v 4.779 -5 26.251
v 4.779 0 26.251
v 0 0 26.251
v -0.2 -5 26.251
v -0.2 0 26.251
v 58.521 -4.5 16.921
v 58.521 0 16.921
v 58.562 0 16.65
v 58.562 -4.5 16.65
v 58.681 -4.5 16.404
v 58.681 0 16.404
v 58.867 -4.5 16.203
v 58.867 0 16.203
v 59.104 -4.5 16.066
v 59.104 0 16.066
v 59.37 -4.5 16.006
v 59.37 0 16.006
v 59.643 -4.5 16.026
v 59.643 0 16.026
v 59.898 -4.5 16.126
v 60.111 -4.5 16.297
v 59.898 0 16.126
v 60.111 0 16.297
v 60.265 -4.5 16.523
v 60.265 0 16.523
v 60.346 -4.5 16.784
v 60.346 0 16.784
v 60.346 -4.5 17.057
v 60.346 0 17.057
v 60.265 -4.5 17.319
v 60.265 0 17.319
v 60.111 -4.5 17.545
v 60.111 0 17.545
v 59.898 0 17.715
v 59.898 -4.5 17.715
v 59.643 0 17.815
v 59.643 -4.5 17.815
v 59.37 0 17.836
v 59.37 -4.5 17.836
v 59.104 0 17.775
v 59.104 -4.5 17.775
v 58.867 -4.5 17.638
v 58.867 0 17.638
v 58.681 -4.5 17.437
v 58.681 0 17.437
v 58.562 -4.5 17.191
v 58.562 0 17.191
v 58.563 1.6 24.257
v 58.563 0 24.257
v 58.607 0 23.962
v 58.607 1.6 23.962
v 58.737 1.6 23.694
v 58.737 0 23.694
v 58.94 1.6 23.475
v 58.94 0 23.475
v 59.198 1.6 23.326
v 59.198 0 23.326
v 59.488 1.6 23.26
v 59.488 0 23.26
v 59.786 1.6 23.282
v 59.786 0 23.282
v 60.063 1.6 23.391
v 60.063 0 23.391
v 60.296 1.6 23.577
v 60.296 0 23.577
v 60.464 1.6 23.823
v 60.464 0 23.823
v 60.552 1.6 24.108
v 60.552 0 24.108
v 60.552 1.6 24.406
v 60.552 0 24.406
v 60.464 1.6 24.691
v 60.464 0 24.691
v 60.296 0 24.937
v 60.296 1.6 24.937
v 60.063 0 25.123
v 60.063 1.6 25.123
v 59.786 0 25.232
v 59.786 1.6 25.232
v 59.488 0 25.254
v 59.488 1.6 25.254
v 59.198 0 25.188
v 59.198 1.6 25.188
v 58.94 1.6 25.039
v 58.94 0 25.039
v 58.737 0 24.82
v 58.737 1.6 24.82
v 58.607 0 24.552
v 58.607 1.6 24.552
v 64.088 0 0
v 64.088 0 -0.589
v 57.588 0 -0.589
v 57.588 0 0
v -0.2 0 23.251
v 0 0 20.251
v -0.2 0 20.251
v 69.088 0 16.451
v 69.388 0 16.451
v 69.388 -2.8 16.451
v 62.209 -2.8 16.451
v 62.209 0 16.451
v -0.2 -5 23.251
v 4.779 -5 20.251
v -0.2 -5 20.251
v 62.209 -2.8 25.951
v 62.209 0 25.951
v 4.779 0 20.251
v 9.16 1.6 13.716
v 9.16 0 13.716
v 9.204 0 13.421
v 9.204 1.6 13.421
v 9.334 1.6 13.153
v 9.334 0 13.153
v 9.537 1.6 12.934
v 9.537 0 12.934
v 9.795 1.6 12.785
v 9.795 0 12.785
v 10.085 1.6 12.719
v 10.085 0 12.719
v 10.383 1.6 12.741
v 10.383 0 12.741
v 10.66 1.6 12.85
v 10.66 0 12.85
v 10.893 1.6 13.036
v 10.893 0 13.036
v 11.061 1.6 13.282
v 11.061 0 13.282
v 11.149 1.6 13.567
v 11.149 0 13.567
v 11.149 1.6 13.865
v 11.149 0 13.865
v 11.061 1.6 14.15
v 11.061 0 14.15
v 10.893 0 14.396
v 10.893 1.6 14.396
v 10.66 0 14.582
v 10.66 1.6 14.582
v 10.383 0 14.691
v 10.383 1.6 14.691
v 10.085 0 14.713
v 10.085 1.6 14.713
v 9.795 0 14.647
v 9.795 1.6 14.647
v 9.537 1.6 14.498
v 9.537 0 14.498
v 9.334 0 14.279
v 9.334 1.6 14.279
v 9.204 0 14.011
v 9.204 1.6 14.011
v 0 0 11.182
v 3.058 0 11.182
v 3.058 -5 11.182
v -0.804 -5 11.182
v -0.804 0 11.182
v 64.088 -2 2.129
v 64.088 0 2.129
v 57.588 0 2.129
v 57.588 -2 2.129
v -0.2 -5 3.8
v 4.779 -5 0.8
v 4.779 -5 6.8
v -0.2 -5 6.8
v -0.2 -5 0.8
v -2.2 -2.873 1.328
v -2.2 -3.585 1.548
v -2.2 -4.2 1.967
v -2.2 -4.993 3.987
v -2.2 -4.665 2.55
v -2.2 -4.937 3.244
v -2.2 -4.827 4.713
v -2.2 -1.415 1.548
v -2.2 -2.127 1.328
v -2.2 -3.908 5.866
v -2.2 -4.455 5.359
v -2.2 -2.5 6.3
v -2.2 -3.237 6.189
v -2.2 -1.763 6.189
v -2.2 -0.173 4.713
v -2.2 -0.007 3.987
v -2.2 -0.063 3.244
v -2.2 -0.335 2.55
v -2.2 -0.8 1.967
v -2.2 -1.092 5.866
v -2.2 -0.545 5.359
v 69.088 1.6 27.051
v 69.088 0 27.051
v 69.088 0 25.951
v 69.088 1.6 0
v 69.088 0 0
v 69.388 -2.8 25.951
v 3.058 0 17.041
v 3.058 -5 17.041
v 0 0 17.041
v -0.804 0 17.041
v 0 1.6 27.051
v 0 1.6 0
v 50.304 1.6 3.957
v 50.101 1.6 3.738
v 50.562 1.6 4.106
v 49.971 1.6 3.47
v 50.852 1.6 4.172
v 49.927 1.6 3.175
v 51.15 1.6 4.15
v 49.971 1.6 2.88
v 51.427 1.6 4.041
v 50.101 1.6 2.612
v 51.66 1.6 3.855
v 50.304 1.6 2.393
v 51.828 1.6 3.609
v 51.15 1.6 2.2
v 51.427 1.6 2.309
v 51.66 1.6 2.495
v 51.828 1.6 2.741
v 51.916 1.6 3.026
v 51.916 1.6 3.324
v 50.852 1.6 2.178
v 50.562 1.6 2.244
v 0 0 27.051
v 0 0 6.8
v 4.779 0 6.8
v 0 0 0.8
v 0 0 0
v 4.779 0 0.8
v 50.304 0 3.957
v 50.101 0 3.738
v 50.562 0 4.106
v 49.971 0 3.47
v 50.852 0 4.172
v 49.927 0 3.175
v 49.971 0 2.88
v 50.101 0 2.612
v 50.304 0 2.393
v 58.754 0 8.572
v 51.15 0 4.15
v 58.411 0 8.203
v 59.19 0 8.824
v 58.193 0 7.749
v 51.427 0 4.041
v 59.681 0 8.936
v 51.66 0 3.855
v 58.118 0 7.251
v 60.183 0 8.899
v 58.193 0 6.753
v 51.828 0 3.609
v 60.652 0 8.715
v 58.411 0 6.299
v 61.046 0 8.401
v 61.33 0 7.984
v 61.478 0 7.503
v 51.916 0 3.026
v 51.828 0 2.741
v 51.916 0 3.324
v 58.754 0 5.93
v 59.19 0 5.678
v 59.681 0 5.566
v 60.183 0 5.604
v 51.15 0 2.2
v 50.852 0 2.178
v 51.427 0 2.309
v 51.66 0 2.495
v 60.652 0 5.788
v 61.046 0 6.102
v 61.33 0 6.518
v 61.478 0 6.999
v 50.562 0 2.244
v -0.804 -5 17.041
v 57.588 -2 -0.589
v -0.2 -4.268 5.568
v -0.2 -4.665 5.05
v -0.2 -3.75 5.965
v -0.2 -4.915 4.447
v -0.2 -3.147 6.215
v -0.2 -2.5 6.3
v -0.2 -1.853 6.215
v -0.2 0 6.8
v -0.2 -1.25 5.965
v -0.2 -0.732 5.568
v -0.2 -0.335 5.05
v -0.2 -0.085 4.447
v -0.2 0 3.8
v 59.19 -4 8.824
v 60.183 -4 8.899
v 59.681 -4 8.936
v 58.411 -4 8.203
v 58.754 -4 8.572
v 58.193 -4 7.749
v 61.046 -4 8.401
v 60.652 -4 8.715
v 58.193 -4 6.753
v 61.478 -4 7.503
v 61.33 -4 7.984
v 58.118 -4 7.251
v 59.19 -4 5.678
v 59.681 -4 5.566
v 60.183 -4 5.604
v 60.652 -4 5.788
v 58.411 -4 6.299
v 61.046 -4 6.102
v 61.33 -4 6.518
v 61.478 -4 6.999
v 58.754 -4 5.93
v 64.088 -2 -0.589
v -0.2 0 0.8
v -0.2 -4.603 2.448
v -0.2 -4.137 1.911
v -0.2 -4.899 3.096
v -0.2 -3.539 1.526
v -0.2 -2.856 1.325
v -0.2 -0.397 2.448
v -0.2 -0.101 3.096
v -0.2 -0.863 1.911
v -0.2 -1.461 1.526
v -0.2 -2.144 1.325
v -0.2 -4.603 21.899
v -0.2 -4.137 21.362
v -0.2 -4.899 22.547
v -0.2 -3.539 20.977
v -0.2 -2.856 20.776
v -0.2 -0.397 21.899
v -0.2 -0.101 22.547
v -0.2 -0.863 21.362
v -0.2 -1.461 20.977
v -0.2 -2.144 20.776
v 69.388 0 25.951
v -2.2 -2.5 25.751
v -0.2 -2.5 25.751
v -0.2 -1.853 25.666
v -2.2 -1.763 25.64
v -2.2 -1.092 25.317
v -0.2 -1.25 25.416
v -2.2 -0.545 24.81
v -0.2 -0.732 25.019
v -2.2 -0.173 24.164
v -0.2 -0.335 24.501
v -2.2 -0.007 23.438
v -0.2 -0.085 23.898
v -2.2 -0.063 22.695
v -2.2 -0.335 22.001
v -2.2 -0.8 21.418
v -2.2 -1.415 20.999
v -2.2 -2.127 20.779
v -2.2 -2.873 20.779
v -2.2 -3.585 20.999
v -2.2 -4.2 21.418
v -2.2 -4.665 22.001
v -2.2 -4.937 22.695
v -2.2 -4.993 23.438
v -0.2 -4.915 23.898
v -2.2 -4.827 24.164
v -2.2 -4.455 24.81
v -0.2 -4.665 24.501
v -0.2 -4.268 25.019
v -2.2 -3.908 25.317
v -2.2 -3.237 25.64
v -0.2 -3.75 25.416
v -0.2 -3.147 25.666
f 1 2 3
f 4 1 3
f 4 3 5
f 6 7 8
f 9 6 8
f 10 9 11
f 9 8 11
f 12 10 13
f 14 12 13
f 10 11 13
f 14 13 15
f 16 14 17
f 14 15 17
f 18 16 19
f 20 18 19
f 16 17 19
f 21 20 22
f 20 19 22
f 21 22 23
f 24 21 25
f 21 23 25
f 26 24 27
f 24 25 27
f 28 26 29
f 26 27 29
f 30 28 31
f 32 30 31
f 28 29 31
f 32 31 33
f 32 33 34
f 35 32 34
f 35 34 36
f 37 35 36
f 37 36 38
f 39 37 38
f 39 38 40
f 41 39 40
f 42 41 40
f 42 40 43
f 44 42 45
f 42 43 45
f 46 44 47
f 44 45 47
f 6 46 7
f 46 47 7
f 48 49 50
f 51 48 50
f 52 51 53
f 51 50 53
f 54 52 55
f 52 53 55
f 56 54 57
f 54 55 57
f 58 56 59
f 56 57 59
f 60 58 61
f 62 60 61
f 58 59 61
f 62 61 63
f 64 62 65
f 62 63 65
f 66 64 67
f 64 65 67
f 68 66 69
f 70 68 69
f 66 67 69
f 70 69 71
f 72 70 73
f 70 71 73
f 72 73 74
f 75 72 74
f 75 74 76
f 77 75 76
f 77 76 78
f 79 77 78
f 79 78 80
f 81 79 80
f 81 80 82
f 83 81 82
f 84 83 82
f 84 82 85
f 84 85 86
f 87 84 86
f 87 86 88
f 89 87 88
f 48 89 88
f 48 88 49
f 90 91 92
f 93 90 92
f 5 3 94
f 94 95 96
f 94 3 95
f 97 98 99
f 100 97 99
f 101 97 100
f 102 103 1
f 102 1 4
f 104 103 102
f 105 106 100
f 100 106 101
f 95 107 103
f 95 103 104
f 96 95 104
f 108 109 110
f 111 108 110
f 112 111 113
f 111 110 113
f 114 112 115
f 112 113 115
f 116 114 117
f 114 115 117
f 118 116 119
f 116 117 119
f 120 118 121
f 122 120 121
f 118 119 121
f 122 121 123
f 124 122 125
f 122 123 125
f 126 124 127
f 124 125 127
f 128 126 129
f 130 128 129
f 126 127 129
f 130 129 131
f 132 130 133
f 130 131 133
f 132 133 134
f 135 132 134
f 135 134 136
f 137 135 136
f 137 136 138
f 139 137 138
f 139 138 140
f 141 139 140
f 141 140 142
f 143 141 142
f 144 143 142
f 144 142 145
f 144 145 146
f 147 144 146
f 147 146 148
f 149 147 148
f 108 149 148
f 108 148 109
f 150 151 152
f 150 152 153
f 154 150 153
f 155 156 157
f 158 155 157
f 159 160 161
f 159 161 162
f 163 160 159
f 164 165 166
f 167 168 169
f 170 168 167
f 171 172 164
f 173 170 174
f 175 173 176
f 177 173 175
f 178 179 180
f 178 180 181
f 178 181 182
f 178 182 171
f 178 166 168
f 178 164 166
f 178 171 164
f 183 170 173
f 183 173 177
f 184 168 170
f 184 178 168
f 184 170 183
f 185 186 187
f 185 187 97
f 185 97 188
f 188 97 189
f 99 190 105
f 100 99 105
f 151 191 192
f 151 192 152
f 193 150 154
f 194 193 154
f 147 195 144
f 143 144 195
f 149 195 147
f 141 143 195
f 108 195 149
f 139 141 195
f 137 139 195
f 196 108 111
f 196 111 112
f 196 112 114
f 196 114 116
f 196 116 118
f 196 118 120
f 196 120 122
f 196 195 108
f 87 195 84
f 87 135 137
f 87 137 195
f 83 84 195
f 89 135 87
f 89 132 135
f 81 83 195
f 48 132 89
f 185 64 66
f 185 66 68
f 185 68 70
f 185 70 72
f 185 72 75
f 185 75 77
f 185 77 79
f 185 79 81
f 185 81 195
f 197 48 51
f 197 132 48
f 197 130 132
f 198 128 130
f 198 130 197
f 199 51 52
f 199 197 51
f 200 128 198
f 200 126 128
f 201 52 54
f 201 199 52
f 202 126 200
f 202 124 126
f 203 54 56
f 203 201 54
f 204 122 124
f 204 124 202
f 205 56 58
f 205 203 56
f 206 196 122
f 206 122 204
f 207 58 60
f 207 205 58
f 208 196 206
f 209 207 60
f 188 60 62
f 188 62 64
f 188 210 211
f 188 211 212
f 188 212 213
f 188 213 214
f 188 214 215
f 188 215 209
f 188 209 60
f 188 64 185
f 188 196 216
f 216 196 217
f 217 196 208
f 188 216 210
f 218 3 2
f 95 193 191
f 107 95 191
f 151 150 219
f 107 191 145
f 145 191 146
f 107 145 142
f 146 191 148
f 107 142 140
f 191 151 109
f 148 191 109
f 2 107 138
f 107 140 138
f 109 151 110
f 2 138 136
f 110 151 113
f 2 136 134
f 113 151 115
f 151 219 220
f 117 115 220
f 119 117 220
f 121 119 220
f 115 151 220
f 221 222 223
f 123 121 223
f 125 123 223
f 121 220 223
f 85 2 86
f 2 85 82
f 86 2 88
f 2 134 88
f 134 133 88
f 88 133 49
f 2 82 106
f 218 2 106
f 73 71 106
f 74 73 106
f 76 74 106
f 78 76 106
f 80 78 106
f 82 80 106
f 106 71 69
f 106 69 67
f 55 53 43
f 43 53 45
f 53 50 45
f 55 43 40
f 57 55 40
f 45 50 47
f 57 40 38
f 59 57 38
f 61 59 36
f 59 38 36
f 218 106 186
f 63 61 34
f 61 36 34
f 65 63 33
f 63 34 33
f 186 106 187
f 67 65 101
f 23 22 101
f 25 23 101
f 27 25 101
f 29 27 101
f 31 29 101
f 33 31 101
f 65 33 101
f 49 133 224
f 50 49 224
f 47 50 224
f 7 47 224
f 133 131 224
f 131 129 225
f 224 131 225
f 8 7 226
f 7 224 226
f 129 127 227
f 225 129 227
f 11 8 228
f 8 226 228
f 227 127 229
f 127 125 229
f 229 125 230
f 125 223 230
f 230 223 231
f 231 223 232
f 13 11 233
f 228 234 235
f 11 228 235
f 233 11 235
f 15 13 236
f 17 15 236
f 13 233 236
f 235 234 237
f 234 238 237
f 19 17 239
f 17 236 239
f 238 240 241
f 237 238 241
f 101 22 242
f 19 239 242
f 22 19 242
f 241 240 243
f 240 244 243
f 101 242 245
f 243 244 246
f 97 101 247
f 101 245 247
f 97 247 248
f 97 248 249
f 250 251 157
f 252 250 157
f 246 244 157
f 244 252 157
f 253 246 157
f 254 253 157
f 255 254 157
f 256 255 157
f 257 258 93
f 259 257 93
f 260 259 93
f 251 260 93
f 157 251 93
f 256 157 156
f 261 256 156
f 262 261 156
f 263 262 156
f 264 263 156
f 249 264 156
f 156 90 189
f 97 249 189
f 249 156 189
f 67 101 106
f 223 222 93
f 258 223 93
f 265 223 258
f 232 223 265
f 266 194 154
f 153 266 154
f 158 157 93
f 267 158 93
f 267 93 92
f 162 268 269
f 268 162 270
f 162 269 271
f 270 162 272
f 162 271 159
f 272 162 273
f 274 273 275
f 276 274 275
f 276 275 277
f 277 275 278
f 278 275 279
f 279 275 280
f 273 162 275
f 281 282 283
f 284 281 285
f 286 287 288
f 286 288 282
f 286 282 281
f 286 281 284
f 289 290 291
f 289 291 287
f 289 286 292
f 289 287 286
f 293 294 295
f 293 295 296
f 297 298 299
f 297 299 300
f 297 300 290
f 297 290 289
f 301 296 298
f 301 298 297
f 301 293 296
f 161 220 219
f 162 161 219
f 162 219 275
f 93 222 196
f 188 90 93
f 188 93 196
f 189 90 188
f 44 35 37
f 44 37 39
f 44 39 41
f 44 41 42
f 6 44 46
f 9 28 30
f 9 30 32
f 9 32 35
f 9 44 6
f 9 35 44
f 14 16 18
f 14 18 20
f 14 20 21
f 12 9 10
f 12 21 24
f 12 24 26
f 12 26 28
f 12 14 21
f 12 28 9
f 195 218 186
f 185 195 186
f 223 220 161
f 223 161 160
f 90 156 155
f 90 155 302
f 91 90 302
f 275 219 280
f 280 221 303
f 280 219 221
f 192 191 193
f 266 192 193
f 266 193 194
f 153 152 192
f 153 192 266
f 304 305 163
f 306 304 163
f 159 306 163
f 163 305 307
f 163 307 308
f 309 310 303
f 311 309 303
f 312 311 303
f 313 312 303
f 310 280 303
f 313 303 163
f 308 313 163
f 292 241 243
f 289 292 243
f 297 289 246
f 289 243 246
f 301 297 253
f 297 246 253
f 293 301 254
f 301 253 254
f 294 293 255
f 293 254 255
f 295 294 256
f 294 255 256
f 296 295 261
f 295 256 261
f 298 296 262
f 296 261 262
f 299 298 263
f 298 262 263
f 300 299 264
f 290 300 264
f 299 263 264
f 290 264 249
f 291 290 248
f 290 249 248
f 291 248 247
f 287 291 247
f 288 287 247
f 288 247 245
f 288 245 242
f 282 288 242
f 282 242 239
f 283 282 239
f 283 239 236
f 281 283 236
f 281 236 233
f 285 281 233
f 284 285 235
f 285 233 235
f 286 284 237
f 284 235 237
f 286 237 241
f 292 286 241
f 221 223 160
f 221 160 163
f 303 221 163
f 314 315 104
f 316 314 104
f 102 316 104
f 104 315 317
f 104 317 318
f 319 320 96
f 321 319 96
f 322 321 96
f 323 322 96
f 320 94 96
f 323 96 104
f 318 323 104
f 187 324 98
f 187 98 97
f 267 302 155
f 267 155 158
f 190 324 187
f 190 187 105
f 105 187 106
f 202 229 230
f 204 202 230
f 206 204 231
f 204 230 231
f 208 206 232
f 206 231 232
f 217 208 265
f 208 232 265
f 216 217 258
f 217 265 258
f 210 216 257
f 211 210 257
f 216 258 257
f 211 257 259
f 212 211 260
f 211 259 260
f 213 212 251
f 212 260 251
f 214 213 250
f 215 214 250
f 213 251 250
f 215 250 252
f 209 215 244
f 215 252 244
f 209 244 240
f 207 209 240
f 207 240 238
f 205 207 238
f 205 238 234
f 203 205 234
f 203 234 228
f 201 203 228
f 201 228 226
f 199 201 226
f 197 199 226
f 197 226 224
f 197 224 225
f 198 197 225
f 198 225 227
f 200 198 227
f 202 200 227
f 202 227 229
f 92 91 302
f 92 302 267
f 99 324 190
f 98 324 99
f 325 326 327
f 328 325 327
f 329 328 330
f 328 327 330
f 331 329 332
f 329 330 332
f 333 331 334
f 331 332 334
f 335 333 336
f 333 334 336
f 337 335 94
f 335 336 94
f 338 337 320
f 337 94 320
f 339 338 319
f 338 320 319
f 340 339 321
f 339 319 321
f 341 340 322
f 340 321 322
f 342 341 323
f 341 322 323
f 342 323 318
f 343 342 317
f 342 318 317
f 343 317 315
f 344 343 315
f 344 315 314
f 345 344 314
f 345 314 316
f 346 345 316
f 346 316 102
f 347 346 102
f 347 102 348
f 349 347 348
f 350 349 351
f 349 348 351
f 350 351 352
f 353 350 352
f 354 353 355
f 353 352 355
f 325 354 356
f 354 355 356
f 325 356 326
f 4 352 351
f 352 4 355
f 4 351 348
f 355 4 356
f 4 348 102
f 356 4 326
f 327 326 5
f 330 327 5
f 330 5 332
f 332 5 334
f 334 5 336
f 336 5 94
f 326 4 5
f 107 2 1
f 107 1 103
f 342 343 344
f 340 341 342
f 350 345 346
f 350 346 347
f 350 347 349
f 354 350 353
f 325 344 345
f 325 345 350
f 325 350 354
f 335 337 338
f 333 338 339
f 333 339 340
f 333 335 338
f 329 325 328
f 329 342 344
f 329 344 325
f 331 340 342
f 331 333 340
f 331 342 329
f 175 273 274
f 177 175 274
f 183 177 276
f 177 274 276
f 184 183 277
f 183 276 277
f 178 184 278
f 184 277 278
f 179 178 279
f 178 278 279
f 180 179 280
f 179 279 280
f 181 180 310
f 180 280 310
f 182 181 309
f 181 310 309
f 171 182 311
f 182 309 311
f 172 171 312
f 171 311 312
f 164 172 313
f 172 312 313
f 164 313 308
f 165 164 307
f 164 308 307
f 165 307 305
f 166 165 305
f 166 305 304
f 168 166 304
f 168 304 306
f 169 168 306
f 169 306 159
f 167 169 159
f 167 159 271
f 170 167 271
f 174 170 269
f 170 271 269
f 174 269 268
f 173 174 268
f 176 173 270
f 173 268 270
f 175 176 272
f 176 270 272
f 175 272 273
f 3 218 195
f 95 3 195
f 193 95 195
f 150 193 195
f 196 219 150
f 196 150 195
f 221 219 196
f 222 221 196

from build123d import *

# Parameters (mm, degrees)
SKETCH1_W           = 69.088
SKETCH1_H           = 27.051
BOSS_EXTRUDE1_DEPTH = 1.6
SKETCH2_W           = 4.978970029
SKETCH2_H           = 6
SKETCH2_W_2         = 3.862002759
SKETCH2_H_2         = 5.859121758
BOSS_EXTRUDE2_DEPTH = 5
SKETCH3_W           = 6.5
SKETCH3_H           = 2.717485229
BOSS_EXTRUDE3_DEPTH = 2
SKETCH4_W           = 7.179475327
SKETCH4_H           = 9.5
BOSS_EXTRUDE4_DEPTH = 2.8
SKETCH5_R           = 1
CUT_EXTRUDE1_DEPTH  = 2.6
SKETCH6_R           = 1.689834655
BOSS_EXTRUDE5_DEPTH = 4
SKETCH7_R           = 0.917545462
BOSS_EXTRUDE6_DEPTH = 4.5
SKETCH8_R           = 2.5
BOSS_EXTRUDE7_DEPTH = 2


with BuildPart() as part:
    # Sketch1 → Boss-Extrude1 (new body)
    with BuildSketch(Plane(origin=(0, 0, 0), x_dir=(1, 0, 0), z_dir=(0, 1, 0))):
        with Locations((34.544, -13.5255)):
            Rectangle(SKETCH1_W, SKETCH1_H)
    extrude(amount=BOSS_EXTRUDE1_DEPTH)

    # Sketch2 → Boss-Extrude2 (add)
    with BuildSketch(Plane(origin=(0, 0, 0), x_dir=(-1, 0, 0), z_dir=(0, -1, 0))):
        with Locations((-2.289485014, -23.251)):
            Rectangle(SKETCH2_W, SKETCH2_H)
        with Locations((-2.289485014, -3.8)):
            Rectangle(SKETCH2_W, SKETCH2_H)
        with Locations((-1.126576215, -14.111503754)):
            Rectangle(SKETCH2_W_2, SKETCH2_H_2)
    extrude(amount=BOSS_EXTRUDE2_DEPTH)

    # Sketch3 → Boss-Extrude3 (add)
    with BuildSketch(Plane(origin=(0, 0, 0), x_dir=(-1, 0, 0), z_dir=(0, -1, 0))):
        with Locations((-60.838, -0.770217549)):
            Rectangle(SKETCH3_W, SKETCH3_H)
    extrude(amount=BOSS_EXTRUDE3_DEPTH)

    # Sketch4 → Boss-Extrude4 (add)
    with BuildSketch(Plane(origin=(0, 0, 0), x_dir=(-1, 0, 0), z_dir=(0, -1, 0))):
        with Locations((-65.798262337, -21.201)):
            Rectangle(SKETCH4_W, SKETCH4_H)
    extrude(amount=BOSS_EXTRUDE4_DEPTH)

    # Sketch5 → Cut-Extrude1 (cut, through all)
    with BuildSketch(Plane(origin=(0, 0, 0), x_dir=(-1, 0, 0), z_dir=(0, -1, 0))):
        with Locations((-59.563, -24.257)):
            Circle(SKETCH5_R)
        with Locations((-50.927, -3.175)):
            Circle(SKETCH5_R)
        with Locations((-10.16, -13.716)):
            Circle(SKETCH5_R)
    extrude(amount=-CUT_EXTRUDE1_DEPTH, mode=Mode.SUBTRACT)

    # Sketch6 → Boss-Extrude5 (add)
    with BuildSketch(Plane(origin=(0, 0, 0), x_dir=(-1, 0, 0), z_dir=(0, -1, 0))):
        with Locations((-59.807454833, -7.251263164)):
            Circle(SKETCH6_R)
    extrude(amount=BOSS_EXTRUDE5_DEPTH)

    # Sketch7 → Boss-Extrude6 (add)
    with BuildSketch(Plane(origin=(0, 0, 0), x_dir=(-1, 0, 0), z_dir=(0, -1, 0))):
        with Locations((-59.438742184, -16.920616946)):
            Circle(SKETCH7_R)
    extrude(amount=BOSS_EXTRUDE6_DEPTH)

    # Sketch8 → Boss-Extrude7 (add)
    with BuildSketch(Plane.ZY.offset(0.2)):
        with Locations((3.8, -2.5)):
            Circle(SKETCH8_R)
        with Locations((23.251, -2.5)):
            Circle(SKETCH8_R)
    extrude(amount=BOSS_EXTRUDE7_DEPTH)


solid = part.part
